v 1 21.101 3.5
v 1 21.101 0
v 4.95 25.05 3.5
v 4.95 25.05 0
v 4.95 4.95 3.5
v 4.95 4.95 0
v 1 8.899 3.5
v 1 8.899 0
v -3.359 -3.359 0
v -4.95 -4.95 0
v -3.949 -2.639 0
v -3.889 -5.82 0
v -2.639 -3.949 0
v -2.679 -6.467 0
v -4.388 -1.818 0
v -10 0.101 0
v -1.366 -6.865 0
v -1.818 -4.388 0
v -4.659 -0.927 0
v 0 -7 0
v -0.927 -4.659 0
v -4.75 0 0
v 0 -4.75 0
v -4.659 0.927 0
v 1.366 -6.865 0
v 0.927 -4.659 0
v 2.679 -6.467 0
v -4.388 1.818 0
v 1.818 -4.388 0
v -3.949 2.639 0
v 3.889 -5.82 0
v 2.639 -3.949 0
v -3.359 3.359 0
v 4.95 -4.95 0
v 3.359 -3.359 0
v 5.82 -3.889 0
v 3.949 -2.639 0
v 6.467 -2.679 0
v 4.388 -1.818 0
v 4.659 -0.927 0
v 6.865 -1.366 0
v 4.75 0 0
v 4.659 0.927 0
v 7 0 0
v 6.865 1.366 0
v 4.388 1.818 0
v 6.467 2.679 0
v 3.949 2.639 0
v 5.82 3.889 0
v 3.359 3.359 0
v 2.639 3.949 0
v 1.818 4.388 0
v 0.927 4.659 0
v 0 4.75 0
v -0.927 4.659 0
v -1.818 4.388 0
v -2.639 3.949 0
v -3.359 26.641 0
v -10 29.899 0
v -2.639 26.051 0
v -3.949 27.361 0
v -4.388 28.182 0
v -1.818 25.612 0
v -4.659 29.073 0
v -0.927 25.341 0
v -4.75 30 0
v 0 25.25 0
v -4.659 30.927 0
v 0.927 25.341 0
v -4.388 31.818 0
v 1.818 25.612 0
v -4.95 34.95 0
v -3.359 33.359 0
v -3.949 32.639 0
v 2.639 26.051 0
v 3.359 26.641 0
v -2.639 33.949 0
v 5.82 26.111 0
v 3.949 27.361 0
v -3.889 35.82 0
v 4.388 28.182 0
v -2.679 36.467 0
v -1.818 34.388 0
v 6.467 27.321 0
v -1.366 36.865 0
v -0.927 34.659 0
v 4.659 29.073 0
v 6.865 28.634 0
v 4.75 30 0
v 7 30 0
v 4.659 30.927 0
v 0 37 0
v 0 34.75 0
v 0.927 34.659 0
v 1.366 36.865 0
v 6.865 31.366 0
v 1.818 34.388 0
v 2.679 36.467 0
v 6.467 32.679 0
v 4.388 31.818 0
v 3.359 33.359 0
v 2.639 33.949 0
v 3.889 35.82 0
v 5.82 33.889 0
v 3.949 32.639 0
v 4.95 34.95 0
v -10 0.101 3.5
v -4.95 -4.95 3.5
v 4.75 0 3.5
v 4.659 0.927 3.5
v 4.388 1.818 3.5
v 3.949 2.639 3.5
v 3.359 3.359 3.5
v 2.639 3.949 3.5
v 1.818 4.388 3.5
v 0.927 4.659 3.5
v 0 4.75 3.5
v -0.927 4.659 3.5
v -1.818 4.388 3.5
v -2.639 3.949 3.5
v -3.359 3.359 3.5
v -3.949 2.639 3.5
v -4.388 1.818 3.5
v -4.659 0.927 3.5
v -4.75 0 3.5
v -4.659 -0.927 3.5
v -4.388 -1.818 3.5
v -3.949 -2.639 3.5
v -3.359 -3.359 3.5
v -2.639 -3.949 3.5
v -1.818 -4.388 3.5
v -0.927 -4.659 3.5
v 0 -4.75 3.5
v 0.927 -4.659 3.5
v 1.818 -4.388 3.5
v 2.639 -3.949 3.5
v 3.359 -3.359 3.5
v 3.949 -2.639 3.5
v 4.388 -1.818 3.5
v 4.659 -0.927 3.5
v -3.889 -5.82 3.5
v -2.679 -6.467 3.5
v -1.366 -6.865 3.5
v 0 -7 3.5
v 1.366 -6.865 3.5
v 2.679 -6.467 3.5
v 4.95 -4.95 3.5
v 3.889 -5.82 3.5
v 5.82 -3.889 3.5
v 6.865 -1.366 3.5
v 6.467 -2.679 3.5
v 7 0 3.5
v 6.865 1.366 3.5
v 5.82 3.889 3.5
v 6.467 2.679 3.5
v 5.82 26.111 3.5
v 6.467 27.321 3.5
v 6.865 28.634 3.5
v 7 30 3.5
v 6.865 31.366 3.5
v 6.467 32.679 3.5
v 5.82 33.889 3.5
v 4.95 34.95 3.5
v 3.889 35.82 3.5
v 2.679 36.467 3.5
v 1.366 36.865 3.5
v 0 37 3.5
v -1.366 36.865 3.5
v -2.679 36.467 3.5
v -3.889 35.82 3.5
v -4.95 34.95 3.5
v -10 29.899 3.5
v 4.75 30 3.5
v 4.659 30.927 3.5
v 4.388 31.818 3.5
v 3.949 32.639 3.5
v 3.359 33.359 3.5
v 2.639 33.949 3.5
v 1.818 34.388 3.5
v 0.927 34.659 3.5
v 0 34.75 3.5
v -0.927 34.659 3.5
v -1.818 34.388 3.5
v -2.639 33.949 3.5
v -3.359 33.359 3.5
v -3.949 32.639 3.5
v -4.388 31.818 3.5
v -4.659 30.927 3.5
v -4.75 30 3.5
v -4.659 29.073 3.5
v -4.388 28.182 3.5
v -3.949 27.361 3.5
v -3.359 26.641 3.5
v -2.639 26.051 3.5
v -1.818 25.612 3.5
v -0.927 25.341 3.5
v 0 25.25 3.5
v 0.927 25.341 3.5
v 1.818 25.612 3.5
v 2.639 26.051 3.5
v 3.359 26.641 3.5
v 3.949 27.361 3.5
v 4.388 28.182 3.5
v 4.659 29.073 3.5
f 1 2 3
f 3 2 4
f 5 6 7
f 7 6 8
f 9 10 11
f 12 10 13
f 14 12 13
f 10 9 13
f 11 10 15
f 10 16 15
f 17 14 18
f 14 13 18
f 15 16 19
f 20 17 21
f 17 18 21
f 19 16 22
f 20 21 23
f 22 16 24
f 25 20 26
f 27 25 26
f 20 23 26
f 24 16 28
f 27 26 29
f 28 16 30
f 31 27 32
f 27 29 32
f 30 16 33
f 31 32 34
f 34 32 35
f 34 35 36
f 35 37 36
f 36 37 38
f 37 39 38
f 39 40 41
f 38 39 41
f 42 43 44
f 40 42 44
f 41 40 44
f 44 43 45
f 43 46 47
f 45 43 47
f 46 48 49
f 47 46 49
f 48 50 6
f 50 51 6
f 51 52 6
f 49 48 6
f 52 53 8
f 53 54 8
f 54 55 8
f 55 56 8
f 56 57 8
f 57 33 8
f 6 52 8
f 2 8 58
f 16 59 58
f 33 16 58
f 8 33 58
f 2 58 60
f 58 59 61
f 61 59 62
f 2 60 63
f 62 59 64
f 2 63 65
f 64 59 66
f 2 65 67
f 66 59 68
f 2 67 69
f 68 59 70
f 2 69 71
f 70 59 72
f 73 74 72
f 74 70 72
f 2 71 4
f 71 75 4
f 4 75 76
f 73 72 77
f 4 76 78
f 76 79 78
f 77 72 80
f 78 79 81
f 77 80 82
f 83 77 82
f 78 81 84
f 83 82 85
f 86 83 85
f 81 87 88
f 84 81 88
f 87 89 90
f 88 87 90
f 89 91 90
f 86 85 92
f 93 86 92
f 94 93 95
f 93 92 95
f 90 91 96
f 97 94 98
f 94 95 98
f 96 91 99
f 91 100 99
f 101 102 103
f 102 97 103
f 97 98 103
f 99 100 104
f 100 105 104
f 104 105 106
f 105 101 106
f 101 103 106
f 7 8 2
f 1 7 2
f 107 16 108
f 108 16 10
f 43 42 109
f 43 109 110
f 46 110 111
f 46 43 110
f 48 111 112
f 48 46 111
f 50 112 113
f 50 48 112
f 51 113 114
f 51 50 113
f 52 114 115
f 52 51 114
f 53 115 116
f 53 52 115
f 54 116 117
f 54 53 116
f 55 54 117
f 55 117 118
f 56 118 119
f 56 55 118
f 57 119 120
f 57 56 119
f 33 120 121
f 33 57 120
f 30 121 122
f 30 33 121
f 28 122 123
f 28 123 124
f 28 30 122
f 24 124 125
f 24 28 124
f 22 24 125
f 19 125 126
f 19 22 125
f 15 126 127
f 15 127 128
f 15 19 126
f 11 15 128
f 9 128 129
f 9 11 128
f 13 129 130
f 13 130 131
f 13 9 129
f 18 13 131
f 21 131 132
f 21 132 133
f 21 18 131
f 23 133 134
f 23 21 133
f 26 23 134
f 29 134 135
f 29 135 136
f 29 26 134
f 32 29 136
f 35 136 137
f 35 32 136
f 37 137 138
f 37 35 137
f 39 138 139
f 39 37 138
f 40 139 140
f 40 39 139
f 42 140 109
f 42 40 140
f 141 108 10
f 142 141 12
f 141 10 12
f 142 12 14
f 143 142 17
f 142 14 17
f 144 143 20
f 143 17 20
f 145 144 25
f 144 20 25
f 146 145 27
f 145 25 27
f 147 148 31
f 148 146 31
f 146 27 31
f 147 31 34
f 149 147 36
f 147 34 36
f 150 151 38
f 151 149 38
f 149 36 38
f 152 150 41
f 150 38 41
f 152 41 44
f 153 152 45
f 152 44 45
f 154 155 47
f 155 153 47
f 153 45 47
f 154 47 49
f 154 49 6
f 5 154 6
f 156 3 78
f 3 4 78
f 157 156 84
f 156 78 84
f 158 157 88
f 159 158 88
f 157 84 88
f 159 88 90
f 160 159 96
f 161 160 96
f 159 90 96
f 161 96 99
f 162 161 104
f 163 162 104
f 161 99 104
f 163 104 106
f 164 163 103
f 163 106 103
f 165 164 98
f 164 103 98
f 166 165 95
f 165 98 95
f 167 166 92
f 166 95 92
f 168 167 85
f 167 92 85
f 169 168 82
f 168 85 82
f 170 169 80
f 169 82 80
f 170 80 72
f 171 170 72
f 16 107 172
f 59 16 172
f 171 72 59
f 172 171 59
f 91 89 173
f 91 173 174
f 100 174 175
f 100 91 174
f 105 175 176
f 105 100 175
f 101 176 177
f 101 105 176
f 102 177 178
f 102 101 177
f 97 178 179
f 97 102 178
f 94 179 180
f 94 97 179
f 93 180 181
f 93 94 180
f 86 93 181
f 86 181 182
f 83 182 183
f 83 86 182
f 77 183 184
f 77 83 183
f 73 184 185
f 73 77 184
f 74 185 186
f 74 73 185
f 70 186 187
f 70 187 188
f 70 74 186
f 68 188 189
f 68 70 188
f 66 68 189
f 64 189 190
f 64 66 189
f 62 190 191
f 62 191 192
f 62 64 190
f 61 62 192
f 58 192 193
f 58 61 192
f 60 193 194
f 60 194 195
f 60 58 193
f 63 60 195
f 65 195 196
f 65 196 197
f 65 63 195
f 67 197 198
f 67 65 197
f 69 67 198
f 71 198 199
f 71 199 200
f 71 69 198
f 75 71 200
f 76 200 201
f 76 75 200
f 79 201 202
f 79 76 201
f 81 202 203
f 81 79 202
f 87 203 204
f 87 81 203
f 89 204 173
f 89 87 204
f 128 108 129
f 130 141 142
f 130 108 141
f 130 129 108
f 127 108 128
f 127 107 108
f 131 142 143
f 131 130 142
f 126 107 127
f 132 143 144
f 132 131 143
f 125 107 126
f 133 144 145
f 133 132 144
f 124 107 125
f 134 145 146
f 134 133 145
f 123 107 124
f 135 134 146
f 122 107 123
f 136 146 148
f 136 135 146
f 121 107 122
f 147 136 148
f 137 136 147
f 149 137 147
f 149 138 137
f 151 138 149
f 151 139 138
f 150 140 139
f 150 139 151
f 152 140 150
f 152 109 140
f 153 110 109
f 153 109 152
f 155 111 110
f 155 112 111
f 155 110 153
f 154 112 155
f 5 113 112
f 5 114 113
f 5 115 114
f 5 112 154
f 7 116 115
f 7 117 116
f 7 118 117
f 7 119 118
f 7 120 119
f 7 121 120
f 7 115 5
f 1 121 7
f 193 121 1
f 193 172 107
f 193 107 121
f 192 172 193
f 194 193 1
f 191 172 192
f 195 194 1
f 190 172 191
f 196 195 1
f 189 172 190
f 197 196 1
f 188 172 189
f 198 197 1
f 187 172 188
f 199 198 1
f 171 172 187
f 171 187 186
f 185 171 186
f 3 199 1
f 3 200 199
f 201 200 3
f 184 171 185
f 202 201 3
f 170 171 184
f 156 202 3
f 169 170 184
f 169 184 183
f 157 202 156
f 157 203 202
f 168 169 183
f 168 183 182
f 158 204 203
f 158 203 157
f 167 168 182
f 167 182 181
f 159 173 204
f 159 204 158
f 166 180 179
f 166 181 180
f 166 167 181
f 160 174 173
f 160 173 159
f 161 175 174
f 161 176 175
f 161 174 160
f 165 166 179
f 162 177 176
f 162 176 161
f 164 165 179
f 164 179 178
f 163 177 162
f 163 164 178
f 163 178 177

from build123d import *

# Parameters (mm, degrees)
CROQUIS1_R              = 7
CROQUIS1_R_2            = 4.75
SALIENTE_EXTRUIR1_DEPTH = 3.5
CROQUIS4_W              = 8.235883517
CROQUIS4_H              = 32.578937154
CORTAR_EXTRUIR4_DEPTH   = 4


with BuildPart() as part:
    # Croquis1 → Saliente-Extruir1 (new body)
    # profile 1 of 3: a face of its own
    with BuildSketch(Plane.XY):
        with BuildLine():
            ThreePointArc((-4.949747468, -4.949747468), (-4.949747468, 4.949747468), (4.949747468, 4.949747468))
            Line((4.949747468, 4.949747468), (1, 8.899494937))
            Line((1, 8.899494937), (1, 21.100505063))
            Line((1, 21.100505063), (4.949747468, 25.050252532))
            ThreePointArc((4.949747468, 25.050252532), (-4.949747468, 25.050252532), (-4.949747468, 34.949747468))
            Line((-4.949747468, 34.949747468), (-13, 26.899494937))
            Line((-13, 26.899494937), (-13, 3.100505063))
            Line((-13, 3.100505063), (-4.949747468, -4.949747468))
        make_face()
    # profile 2 of 3: a face of its own
    with BuildSketch(Plane.XY):
        with Locations((0, 30)):
            Circle(CROQUIS1_R)
        with Locations((0, 30)):
            Circle(CROQUIS1_R_2, mode=Mode.SUBTRACT)
    # profile 3 of 3: a face of its own
    with BuildSketch(Plane.XY):
        Circle(CROQUIS1_R)
        Circle(CROQUIS1_R_2, mode=Mode.SUBTRACT)
    extrude(amount=SALIENTE_EXTRUIR1_DEPTH)

    # Croquis4 → Cortar-Extruir4 (cut)
    with BuildSketch(Plane.XY.offset(3.5)):
        with Locations((-14.117941759, 13.61002636)):
            Rectangle(CROQUIS4_W, CROQUIS4_H)
    extrude(amount=-CORTAR_EXTRUIR4_DEPTH, mode=Mode.SUBTRACT)


solid = part.part
